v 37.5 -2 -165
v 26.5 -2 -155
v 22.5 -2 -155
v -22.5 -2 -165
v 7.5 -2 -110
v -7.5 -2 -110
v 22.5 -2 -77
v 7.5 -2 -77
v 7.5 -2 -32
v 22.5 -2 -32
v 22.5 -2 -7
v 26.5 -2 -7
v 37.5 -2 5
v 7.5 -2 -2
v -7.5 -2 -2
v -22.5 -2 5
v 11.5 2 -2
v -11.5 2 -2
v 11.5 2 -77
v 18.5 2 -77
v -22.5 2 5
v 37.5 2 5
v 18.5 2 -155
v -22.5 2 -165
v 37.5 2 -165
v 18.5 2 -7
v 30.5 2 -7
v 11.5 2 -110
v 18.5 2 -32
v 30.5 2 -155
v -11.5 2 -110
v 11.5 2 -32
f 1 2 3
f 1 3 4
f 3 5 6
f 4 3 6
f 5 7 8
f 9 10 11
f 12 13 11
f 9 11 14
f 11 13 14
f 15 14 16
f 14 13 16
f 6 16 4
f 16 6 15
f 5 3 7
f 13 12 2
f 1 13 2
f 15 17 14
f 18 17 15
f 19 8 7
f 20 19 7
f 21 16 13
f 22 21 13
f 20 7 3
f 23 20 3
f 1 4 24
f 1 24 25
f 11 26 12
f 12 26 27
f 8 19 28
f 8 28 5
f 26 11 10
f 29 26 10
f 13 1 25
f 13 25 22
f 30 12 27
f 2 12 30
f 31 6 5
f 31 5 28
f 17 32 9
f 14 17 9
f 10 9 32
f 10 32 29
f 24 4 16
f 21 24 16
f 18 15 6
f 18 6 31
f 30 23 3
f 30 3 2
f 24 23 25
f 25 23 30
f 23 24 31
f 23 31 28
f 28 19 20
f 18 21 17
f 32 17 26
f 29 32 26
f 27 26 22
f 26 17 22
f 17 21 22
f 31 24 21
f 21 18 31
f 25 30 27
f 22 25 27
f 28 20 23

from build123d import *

# Parameters (mm, degrees)
DODANIE_WYCI_GNI_CIE1_DEPTH   = 110
DODANIE_WYCI_GNI_CIE1_2_DEPTH = 110
SZKIC2_W                      = 45
SZKIC2_H                      = 5
DODANIE_WYCI_GNI_CIE2_DEPTH   = 4
SZKIC4_W                      = 35
SZKIC4_H                      = 30
WYTNIJ_WYCI_GNI_CIE1_DEPTH    = 10
SZKIC5_W                      = 45
SZKIC5_H                      = 50
DODANIE_WYCI_GNI_CIE3_DEPTH   = 4
SZKIC6_W                      = 4
SZKIC6_H                      = 148
WYTNIJ_WYCI_GNI_CIE2_DEPTH    = 10
SFAZOWANIE1_SIZE              = 4
DODANIE_WYCI_GNI_CIE4_DEPTH   = 2
SZKIC9_W                      = 15
SZKIC9_H                      = 45
WYTNIJ_WYCI_GNI_CIE3_DEPTH    = 80


with BuildPart() as part:
    # Szkic1 → Dodanie-wyciągnięcie1 (new body)
    with BuildSketch(Plane.XY):
        Polygon((-7.5, -2), (-11.5, 2), (-22.5, 2), (-22.5, -2), align=None)
    extrude(amount=-DODANIE_WYCI_GNI_CIE1_DEPTH)



with BuildPart() as body_2:
    # Szkic1 → Dodanie-wyci_gni_cie1 2 (new body)
    with BuildSketch(Plane.XY):
        Polygon((22.5, 2), (11.5, 2), (7.5, -2), (22.5, -2), align=None)
    extrude(amount=-DODANIE_WYCI_GNI_CIE1_2_DEPTH)


with BuildPart() as part_1:
    add(part.part)

    add(body_2.part)  # Dodanie-wyciągnięcie2 merges body 2
    # Szkic2 → Dodanie-wyciągnięcie2 (add)
    with BuildSketch(Plane.XZ.offset(2)):
        with Locations((0, 2.5)):
            Rectangle(SZKIC2_W, SZKIC2_H)
        with Locations((0, -112.5)):
            Rectangle(SZKIC2_W, SZKIC2_H)
    extrude(amount=-DODANIE_WYCI_GNI_CIE2_DEPTH)

    # Szkic4 → Wytnij-wyciągnięcie1 (cut)
    with BuildSketch(Plane(origin=(0, 2, 0), x_dir=(1, 0, 0), z_dir=(0, 1, 0))):
        with Locations((22.5, 55)):
            Rectangle(SZKIC4_W, SZKIC4_H)
    extrude(amount=-WYTNIJ_WYCI_GNI_CIE1_DEPTH, mode=Mode.SUBTRACT)

    # Szkic5 → Dodanie-wyciągnięcie3 (add)
    with BuildSketch(Plane.XZ.offset(2)):
        with Locations((0, -140)):
            Rectangle(SZKIC5_W, SZKIC5_H)
        Polygon((37.5, 5), (22.5, 5), (22.5, -40), (22.5, -70), (22.5, -115), (22.5, -165), (37.5, -165), align=None)
    extrude(amount=-DODANIE_WYCI_GNI_CIE3_DEPTH)

    # Szkic6 → Wytnij-wyciągnięcie2 (cut)
    with BuildSketch(Plane(origin=(0, 2, 0), x_dir=(1, 0, 0), z_dir=(0, 1, 0))):
        with Locations((24.5, 81)):
            Rectangle(SZKIC6_W, SZKIC6_H)
    extrude(amount=-WYTNIJ_WYCI_GNI_CIE2_DEPTH, mode=Mode.SUBTRACT)

    # Sfazowanie1
    sfazowanie1_edges = [part_1.edges().sort_by_distance(p)[0] for p in [
        (22.5, 2, -23.5),
        (22.5, 2, -112.5),
        (26.5, 2, -81),
    ]]
    chamfer(sfazowanie1_edges, length=SFAZOWANIE1_SIZE - 0.0001)  # a hair under: the kernel refuses the full size

    # Szkic7 → Dodanie-wyciągnięcie4 (add)
    with BuildSketch(Plane(origin=(0, 0, 0), x_dir=(-1, 0, 0), z_dir=(0, 0, -1))):
        Polygon((-11.5, 2), (-7.5, -2), (7.5, -2), (11.5, 2), align=None)
    extrude(amount=DODANIE_WYCI_GNI_CIE4_DEPTH)

    # Szkic9 → Wytnij-wyciągnięcie3 (cut)
    with BuildSketch(Plane.XZ.offset(2)):
        with Locations((15, -54.5)):
            Rectangle(SZKIC9_W, SZKIC9_H)
    extrude(amount=-WYTNIJ_WYCI_GNI_CIE3_DEPTH, mode=Mode.SUBTRACT)


solid = part_1.part
